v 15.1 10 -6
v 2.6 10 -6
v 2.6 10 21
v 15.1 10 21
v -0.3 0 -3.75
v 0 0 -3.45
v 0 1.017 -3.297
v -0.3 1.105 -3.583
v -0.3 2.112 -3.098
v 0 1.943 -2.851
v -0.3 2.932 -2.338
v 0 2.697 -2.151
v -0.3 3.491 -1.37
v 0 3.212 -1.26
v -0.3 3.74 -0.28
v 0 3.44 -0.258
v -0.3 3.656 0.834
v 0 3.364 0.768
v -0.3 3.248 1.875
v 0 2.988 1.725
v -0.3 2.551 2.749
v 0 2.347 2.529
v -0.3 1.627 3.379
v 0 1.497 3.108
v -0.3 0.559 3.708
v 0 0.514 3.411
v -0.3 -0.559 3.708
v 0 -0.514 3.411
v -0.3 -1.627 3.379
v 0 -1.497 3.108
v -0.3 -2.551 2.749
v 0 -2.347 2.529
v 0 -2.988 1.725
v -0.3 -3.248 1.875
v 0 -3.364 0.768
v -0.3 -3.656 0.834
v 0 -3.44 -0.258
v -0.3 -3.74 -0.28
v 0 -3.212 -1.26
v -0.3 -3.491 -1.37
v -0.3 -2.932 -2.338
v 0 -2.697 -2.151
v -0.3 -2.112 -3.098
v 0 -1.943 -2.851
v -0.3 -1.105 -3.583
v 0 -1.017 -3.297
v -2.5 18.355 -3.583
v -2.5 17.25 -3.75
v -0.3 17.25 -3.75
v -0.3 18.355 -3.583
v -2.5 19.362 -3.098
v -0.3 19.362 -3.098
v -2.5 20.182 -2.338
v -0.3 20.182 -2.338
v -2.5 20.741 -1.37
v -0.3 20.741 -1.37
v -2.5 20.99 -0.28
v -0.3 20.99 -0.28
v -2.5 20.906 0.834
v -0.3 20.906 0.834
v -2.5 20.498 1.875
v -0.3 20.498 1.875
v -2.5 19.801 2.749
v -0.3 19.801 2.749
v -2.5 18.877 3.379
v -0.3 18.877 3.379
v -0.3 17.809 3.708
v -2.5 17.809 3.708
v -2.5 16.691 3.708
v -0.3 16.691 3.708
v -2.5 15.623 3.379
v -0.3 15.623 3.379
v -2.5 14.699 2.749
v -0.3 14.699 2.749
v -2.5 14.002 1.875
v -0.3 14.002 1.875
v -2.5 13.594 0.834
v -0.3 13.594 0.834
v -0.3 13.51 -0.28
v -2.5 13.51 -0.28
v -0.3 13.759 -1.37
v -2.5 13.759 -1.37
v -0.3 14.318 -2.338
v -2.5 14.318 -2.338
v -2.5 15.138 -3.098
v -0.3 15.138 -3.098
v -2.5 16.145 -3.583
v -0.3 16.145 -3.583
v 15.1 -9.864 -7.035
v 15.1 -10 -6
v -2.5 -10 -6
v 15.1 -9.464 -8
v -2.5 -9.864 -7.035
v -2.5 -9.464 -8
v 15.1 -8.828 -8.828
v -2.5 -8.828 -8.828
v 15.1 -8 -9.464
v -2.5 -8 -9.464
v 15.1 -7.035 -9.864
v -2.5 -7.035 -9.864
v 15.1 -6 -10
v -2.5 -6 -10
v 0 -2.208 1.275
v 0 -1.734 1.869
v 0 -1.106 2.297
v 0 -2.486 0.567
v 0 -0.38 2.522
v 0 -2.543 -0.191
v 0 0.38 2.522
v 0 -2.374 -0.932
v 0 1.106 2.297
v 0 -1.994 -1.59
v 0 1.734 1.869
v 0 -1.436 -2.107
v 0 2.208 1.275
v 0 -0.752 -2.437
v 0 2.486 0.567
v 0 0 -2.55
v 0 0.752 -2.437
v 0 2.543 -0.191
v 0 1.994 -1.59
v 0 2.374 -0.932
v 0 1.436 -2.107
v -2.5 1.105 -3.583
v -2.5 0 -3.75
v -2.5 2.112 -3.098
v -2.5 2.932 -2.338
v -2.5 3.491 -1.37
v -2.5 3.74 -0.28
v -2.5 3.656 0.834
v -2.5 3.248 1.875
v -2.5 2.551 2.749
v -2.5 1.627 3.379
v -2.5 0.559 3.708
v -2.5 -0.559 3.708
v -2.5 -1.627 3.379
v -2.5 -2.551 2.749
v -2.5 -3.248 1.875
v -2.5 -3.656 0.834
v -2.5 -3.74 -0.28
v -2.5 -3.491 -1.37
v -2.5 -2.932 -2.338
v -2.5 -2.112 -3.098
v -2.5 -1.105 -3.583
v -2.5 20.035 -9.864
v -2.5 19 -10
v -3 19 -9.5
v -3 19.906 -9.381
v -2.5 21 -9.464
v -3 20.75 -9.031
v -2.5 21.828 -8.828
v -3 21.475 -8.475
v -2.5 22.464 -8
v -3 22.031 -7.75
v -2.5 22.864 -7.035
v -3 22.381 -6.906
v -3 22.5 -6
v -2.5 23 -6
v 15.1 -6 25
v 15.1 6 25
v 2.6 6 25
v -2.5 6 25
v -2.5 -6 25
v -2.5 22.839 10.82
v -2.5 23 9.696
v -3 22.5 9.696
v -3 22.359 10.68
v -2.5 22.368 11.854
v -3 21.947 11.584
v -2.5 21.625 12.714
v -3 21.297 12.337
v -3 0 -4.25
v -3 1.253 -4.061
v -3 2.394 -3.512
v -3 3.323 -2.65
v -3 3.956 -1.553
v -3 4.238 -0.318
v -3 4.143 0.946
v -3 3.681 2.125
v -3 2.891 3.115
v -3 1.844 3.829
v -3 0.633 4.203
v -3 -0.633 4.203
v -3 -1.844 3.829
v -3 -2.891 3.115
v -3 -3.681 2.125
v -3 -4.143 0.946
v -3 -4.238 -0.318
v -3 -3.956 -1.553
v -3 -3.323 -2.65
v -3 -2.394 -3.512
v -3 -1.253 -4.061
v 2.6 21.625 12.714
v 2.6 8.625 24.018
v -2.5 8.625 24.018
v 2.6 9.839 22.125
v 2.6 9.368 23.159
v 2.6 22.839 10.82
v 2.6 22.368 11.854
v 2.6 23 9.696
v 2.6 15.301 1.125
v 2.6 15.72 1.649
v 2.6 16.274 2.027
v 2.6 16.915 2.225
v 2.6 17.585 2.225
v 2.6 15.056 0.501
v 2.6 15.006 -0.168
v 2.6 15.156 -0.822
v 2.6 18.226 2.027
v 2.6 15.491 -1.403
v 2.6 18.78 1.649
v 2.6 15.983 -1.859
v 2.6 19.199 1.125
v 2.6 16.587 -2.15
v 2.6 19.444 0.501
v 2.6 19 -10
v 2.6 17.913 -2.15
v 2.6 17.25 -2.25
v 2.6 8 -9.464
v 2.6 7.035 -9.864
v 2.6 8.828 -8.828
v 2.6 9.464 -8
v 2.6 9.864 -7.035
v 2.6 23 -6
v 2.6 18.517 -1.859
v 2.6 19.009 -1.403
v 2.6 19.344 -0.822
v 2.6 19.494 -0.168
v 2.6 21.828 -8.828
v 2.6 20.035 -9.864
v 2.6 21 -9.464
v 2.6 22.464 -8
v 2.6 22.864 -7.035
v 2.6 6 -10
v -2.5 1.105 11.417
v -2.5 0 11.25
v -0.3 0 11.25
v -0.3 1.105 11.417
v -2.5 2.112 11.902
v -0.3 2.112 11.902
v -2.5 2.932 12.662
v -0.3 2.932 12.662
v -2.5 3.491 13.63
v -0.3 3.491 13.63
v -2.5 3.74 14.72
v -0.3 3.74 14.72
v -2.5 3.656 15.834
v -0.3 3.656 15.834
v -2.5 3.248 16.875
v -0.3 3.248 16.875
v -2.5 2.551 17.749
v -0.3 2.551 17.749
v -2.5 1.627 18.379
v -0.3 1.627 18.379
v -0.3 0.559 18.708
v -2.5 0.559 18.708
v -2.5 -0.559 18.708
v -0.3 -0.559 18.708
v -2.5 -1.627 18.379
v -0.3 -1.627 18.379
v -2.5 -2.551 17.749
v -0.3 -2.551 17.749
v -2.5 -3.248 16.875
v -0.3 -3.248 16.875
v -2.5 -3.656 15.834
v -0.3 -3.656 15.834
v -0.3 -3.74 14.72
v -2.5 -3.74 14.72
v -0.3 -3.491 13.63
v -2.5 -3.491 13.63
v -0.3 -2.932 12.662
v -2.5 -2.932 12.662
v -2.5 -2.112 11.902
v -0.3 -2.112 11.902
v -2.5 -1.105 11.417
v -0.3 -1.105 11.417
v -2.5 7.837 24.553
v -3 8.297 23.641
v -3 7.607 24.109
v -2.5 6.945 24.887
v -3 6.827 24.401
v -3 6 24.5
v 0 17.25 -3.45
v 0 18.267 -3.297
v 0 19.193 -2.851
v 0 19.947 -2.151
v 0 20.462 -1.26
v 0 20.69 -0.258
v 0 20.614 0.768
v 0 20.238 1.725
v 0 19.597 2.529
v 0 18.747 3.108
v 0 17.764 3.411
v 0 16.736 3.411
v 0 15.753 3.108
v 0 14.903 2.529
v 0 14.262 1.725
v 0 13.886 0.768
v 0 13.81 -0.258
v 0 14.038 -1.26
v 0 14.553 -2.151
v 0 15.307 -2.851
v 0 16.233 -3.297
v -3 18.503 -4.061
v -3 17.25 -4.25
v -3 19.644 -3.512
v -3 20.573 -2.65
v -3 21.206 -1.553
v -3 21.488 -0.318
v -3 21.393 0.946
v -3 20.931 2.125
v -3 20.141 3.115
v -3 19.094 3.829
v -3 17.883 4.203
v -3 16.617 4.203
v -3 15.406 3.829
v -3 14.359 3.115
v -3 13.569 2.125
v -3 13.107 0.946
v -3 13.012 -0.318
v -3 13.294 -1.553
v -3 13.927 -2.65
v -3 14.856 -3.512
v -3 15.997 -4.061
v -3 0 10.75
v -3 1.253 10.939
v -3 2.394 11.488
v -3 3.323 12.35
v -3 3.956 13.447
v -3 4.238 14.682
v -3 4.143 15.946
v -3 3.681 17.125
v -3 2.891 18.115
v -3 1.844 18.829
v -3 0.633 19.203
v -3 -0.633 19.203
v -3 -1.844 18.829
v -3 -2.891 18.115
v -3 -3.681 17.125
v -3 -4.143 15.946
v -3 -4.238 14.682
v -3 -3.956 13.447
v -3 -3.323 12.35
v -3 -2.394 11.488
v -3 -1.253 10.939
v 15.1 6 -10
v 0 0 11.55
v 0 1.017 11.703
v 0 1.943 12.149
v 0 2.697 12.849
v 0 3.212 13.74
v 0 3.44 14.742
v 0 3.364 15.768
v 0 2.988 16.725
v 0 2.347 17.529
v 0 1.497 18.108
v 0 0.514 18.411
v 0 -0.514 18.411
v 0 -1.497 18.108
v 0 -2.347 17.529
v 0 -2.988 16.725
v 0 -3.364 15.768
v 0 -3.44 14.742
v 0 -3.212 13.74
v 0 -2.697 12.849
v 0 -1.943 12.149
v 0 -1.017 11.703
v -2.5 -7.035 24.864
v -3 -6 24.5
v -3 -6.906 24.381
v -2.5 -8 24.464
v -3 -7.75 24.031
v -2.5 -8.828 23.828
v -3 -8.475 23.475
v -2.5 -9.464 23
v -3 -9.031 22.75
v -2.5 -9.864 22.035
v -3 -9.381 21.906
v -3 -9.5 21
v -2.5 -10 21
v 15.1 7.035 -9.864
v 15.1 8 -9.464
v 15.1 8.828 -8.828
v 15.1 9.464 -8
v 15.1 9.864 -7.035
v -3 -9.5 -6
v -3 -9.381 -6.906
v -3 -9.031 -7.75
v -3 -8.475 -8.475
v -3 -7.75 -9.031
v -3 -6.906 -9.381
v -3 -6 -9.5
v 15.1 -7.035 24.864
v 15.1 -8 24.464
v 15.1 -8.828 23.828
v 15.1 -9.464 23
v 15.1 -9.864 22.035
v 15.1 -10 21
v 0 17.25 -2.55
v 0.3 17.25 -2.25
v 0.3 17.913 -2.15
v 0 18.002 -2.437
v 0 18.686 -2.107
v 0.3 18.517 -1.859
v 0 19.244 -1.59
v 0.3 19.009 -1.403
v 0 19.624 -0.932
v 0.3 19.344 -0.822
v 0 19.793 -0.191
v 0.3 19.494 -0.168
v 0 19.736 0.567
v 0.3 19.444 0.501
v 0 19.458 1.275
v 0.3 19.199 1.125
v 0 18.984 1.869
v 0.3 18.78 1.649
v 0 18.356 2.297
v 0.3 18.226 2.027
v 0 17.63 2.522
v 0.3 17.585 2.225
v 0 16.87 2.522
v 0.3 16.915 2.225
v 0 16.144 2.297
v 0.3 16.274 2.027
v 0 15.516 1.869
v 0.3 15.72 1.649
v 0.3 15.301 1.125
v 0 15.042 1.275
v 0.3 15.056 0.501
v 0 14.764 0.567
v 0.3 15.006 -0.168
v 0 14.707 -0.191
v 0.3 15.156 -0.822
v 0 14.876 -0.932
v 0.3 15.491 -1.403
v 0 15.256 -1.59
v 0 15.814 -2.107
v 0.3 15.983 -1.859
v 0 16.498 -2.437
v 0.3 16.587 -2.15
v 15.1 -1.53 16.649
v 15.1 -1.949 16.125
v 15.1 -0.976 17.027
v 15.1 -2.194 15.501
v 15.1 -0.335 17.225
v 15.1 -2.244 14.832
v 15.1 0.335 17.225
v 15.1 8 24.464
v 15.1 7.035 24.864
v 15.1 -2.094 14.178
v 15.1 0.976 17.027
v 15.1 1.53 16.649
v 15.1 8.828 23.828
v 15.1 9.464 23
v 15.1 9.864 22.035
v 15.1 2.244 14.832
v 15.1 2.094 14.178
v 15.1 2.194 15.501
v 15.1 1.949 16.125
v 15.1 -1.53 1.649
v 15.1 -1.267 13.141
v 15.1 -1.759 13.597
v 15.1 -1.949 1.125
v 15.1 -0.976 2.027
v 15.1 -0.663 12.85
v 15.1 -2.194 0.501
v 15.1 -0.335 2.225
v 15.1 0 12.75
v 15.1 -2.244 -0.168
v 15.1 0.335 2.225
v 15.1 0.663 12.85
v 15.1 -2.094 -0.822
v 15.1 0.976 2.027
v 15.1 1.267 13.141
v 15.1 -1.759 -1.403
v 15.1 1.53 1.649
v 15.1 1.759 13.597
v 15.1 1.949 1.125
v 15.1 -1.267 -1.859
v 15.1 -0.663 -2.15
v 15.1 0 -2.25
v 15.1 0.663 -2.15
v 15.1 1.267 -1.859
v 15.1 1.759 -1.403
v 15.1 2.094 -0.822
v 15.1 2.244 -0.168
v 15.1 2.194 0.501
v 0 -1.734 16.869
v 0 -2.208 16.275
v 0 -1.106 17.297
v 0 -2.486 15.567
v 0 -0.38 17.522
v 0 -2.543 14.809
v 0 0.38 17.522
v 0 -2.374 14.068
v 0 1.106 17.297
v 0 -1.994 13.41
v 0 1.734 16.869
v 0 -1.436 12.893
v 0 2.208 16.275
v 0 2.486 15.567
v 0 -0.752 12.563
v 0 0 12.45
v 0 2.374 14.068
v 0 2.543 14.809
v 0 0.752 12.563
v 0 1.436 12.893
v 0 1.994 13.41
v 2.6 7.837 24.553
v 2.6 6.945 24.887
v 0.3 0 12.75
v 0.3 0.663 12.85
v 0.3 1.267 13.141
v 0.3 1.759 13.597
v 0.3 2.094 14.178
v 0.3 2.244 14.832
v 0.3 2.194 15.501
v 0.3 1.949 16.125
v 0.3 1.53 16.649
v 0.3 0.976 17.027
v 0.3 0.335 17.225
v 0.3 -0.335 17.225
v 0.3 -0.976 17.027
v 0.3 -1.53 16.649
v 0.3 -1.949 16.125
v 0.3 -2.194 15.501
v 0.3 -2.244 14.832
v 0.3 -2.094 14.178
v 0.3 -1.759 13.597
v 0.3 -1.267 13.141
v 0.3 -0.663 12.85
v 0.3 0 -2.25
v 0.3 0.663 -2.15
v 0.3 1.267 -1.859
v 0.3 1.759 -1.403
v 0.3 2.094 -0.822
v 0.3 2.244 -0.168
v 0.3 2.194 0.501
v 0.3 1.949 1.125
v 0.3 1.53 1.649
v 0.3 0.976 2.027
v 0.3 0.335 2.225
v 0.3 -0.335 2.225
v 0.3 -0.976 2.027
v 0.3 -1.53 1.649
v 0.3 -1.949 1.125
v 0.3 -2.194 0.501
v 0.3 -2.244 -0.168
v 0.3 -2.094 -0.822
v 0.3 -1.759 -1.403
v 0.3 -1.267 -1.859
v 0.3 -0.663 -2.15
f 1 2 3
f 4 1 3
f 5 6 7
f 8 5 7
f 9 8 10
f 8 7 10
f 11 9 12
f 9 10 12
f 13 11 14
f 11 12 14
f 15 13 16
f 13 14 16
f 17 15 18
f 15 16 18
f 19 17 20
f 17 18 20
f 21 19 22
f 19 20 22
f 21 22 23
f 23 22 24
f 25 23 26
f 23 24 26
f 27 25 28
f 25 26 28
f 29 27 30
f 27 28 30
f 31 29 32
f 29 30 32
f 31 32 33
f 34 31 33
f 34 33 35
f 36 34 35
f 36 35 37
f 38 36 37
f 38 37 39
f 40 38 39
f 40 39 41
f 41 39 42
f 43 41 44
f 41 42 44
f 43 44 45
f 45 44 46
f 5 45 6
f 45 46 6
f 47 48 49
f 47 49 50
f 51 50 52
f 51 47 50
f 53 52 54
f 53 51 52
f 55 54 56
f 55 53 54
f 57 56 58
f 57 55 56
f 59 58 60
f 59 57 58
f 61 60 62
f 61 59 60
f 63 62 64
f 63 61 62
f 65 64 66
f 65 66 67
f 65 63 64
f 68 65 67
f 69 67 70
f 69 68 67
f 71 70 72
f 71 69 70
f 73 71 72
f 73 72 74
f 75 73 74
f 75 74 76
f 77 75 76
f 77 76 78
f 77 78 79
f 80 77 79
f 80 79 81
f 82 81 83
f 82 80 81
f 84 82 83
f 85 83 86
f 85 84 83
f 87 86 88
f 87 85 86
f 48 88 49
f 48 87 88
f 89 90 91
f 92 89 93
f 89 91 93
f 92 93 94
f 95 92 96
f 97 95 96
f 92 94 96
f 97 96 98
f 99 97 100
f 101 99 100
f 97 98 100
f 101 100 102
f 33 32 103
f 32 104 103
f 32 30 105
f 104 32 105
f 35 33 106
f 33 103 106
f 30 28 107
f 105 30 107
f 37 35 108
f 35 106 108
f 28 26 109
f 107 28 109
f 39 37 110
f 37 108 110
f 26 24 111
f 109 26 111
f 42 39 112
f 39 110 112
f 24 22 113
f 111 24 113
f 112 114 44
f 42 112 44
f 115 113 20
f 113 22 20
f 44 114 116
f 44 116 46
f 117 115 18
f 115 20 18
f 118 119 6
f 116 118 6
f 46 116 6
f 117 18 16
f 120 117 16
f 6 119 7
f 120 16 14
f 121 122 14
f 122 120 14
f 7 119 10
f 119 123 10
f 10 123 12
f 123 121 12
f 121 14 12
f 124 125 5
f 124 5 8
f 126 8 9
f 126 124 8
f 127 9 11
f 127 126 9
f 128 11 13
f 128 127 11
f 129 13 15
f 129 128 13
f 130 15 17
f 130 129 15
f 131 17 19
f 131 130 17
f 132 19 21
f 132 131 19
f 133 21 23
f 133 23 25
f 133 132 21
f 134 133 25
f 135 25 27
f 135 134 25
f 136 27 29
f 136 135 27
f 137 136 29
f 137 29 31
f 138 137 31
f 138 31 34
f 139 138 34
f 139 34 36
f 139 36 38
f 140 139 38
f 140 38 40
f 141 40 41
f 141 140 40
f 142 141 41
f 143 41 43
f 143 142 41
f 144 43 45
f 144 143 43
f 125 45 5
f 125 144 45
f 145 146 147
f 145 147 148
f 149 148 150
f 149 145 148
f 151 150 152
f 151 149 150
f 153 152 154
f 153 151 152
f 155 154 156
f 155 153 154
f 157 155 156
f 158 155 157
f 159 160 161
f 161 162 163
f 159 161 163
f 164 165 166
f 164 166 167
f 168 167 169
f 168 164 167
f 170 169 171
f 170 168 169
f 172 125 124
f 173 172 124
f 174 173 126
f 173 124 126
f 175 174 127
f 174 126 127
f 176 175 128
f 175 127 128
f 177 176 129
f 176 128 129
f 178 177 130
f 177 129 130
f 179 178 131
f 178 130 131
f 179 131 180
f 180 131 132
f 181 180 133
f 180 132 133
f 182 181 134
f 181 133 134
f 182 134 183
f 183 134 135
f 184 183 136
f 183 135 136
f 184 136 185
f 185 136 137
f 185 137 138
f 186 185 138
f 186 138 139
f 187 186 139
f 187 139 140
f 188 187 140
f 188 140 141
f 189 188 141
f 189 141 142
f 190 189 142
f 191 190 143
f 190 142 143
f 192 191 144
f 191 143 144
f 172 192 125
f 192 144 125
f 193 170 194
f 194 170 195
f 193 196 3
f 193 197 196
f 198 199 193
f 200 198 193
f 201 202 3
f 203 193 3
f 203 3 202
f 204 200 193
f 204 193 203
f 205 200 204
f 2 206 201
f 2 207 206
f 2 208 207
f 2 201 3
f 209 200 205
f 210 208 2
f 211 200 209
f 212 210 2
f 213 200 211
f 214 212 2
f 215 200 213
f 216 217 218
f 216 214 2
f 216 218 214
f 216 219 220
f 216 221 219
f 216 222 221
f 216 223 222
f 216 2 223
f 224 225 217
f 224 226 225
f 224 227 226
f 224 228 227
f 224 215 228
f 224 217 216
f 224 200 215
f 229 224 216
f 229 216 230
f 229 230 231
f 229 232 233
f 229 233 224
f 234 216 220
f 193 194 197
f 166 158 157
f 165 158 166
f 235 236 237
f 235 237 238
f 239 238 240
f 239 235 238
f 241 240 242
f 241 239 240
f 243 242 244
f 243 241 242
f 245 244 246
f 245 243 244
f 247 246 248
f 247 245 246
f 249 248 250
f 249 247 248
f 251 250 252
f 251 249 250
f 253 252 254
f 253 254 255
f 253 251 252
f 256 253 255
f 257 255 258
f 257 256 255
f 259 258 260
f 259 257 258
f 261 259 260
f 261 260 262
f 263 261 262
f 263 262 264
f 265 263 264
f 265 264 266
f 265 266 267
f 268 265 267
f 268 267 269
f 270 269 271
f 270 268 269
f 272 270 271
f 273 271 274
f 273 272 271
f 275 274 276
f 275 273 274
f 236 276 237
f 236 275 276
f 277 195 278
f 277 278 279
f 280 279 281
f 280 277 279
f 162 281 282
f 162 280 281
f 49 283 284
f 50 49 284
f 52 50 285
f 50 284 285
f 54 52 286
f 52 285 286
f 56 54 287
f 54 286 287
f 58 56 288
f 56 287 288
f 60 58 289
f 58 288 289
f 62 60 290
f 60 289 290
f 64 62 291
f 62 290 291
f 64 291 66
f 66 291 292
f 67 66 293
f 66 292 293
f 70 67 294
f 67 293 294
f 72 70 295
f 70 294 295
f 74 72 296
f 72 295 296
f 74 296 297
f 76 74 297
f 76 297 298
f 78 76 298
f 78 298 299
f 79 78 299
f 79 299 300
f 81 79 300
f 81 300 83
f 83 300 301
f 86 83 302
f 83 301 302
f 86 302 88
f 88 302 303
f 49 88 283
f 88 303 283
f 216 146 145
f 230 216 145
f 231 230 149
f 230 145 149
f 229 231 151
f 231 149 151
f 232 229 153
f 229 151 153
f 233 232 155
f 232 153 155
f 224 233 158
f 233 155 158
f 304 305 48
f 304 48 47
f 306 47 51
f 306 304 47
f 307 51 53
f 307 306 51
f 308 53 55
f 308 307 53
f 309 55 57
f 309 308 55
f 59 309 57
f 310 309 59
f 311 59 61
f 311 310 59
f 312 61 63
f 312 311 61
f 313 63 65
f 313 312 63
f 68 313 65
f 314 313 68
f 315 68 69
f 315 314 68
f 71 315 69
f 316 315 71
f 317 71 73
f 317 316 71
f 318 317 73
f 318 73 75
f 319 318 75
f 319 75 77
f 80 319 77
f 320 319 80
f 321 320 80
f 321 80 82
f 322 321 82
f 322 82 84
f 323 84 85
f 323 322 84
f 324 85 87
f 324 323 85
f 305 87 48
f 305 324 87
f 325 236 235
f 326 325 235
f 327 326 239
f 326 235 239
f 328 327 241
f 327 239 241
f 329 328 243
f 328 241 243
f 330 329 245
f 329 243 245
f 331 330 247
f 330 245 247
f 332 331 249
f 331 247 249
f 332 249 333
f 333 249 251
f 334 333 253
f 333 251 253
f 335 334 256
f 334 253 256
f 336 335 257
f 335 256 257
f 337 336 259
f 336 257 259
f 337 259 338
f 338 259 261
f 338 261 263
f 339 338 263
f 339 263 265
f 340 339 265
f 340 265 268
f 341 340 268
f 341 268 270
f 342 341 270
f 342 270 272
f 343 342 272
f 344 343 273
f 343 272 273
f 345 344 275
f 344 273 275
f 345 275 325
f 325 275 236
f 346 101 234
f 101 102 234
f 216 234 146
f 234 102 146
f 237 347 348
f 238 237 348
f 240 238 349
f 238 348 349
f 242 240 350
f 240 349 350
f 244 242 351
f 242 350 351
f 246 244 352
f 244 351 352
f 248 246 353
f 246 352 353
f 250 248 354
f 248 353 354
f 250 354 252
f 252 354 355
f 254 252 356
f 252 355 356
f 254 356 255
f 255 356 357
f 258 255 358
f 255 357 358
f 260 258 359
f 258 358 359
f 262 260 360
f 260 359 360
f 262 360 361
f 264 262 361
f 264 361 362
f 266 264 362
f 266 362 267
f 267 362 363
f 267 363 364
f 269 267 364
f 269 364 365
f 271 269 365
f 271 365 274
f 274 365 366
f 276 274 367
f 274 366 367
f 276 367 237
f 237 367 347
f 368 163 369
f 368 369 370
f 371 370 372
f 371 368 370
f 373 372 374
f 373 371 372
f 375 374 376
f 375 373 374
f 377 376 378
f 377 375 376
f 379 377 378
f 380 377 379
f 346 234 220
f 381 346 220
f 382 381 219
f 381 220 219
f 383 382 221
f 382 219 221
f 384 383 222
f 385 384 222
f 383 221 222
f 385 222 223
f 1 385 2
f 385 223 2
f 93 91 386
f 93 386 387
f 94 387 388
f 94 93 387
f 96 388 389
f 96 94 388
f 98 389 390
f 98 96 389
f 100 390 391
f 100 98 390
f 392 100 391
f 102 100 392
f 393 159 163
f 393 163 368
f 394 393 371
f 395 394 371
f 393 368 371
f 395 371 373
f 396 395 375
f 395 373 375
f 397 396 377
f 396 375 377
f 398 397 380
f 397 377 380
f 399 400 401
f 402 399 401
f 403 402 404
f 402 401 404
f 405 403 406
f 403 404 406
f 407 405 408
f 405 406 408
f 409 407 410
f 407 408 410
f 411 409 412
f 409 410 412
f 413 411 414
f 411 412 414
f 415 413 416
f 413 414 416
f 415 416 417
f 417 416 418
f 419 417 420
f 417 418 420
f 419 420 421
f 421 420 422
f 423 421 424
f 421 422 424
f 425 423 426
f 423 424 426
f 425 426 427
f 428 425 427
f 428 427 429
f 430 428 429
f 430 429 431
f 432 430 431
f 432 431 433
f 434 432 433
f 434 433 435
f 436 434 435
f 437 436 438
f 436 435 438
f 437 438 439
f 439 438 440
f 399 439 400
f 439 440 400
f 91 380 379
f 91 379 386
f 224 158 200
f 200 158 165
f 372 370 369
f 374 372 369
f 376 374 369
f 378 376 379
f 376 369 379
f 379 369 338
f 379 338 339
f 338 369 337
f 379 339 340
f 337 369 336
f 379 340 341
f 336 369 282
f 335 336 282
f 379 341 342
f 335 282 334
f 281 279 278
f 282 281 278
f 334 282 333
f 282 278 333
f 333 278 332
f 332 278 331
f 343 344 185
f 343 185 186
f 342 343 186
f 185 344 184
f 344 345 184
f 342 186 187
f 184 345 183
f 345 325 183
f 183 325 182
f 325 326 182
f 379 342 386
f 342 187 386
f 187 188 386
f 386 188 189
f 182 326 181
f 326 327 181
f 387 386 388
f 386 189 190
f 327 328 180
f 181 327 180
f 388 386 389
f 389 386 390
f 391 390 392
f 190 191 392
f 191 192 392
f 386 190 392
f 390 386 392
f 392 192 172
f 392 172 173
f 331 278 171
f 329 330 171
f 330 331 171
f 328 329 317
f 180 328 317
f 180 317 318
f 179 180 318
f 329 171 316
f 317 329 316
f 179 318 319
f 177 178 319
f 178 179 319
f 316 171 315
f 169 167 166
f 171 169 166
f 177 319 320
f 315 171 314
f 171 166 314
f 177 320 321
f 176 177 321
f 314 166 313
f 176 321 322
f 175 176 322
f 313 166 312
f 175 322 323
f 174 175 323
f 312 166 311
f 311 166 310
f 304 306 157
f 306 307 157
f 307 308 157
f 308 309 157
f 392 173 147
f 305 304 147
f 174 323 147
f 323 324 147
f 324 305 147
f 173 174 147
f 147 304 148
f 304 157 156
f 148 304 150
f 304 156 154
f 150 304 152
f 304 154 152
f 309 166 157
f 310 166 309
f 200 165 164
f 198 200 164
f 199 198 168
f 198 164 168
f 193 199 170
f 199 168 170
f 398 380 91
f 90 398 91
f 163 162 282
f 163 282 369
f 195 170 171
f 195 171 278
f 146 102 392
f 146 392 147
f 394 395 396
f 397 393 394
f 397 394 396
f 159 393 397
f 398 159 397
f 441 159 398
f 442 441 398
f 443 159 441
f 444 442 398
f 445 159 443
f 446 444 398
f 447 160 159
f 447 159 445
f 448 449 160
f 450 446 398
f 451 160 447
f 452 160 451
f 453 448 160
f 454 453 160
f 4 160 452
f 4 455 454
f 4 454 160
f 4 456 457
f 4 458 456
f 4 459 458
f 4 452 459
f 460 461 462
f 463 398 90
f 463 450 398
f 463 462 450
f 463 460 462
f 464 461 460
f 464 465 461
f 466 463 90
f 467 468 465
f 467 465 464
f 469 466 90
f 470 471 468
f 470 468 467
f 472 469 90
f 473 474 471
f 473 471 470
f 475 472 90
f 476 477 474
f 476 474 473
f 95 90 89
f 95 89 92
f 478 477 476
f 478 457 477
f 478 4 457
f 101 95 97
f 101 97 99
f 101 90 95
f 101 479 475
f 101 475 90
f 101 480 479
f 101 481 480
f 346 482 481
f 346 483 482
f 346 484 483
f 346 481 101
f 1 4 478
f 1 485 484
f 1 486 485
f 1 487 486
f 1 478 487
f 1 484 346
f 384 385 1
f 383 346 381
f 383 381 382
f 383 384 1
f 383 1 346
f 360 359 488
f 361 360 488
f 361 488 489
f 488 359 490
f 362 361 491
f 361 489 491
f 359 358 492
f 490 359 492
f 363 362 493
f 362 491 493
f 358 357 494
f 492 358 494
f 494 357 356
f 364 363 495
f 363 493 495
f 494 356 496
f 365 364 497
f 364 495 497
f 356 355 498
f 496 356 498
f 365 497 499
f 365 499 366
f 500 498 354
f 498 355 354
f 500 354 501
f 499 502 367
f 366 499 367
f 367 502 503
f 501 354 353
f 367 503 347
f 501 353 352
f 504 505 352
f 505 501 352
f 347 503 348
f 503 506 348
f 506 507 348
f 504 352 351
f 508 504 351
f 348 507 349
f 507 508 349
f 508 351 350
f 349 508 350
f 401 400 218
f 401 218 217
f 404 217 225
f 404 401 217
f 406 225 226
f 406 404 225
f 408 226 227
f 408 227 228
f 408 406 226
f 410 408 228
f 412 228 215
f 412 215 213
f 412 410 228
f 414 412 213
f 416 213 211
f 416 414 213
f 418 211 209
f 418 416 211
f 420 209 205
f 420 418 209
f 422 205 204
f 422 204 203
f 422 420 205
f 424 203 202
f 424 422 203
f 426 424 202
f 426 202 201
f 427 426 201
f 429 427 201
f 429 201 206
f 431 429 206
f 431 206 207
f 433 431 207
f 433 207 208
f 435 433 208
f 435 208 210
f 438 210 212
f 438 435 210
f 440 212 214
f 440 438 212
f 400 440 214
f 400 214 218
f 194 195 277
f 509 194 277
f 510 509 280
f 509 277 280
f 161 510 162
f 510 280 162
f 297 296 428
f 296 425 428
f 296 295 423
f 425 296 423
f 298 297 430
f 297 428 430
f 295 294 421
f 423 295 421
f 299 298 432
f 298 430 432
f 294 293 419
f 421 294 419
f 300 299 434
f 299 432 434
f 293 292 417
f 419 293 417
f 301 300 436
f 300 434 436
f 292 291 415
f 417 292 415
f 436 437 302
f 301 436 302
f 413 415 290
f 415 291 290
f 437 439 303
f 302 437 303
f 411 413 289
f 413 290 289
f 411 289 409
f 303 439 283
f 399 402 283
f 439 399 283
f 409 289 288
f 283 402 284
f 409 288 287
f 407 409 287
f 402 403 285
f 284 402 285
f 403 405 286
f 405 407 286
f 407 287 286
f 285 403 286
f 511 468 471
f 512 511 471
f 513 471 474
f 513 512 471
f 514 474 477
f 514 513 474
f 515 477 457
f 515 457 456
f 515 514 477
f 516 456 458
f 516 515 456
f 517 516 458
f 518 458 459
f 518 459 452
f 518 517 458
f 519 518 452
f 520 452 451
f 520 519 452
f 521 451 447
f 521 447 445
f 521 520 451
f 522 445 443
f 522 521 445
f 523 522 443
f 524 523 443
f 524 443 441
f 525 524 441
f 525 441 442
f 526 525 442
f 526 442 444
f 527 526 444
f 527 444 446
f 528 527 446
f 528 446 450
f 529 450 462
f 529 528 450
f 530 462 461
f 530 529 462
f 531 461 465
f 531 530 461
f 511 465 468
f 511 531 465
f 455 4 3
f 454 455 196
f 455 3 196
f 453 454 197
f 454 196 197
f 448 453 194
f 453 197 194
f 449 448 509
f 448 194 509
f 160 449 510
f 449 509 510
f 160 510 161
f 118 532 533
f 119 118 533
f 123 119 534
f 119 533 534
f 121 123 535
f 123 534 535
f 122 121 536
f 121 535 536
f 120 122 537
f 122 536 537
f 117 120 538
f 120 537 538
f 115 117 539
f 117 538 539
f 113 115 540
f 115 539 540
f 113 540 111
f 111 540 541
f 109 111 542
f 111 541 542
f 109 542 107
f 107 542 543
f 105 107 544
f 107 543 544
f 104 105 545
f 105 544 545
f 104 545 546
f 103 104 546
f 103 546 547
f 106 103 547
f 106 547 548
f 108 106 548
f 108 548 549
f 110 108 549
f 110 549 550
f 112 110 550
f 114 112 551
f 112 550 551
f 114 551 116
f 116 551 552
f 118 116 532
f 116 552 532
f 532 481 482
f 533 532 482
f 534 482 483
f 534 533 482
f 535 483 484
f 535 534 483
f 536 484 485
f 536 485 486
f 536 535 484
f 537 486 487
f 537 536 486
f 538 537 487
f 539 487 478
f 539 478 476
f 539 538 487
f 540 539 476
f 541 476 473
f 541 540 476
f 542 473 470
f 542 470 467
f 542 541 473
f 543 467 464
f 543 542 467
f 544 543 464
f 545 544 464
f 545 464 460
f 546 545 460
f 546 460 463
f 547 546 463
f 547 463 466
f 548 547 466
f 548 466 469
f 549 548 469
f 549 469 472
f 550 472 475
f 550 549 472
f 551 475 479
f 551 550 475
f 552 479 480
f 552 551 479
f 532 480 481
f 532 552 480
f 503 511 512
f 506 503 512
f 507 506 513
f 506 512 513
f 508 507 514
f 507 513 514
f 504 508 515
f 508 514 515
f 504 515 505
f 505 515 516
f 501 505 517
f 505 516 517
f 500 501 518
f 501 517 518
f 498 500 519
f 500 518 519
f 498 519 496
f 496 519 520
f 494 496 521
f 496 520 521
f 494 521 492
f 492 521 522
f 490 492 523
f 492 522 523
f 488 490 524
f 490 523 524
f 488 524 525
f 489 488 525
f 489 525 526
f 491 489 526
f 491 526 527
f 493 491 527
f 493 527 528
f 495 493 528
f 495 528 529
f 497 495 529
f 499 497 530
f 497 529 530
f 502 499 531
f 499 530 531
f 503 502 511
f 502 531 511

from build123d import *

# Parameters (mm, degrees)
SKETCH1_R           = 2.25
BOSS_EXTRUDE1_DEPTH = 2.6
BOSS_EXTRUDE3_START = -3
SKETCH3_R           = 3.75
BOSS_EXTRUDE3_DEPTH = 3
CHAMFER2_SIZE       = 0.3
CHAMFER3_SIZE       = 0.5
SKETCH4_R           = 2.25
BOSS_EXTRUDE4_DEPTH = 12.5


with BuildPart() as part:
    # Sketch1 → Boss-Extrude1 (new body)
    with BuildSketch(Plane(origin=(0, 0, 0), x_dir=(0, 0, -1), z_dir=(1, 0, 0))):
        with BuildLine():
            Line((-21, -10), (6, -10))
            ThreePointArc((6, -10), (8.828427125, -8.828427125), (10, -6))
            Line((10, -6), (10, 19))
            ThreePointArc((10, 19), (8.828427125, 21.828427125), (6, 23))
            Line((6, 23), (-9.695652174, 23))
            ThreePointArc((-9.695652174, 23), (-11.354136506, 22.63997661), (-12.714074263, 21.62471486))
            Line((-12.714074263, 21.62471486), (-24.018422089, 8.62471486))
            ThreePointArc((-24.018422089, 8.62471486), (-24.746577662, 7.401126626), (-25, 6))
            Line((-25, 6), (-25, -6))
            ThreePointArc((-25, -6), (-23.828427125, -8.828427125), (-21, -10))
        make_face()
        with Locations((-15, 0)):
            Circle(SKETCH1_R, mode=Mode.SUBTRACT)
        with Locations((0, 17.25)):
            Circle(SKETCH1_R, mode=Mode.SUBTRACT)
        Circle(SKETCH1_R, mode=Mode.SUBTRACT)
    extrude(amount=BOSS_EXTRUDE1_DEPTH)

    # Sketch3 → Boss-Extrude3 (add)
    with BuildSketch(Plane(origin=(0, 0, 0), x_dir=(0, 0, -1), z_dir=(1, 0, 0)).offset(BOSS_EXTRUDE3_START)):
        with BuildLine():
            Line((-21, -10), (6, -10))
            ThreePointArc((6, -10), (8.828427125, -8.828427125), (10, -6))
            Line((10, -6), (10, 19))
            ThreePointArc((10, 19), (8.828427125, 21.828427125), (6, 23))
            Line((6, 23), (-9.695652174, 23))
            ThreePointArc((-9.695652174, 23), (-11.354136506, 22.63997661), (-12.714074263, 21.62471486))
            Line((-12.714074263, 21.62471486), (-24.018422089, 8.62471486))
            ThreePointArc((-24.018422089, 8.62471486), (-24.746577662, 7.401126626), (-25, 6))
            Line((-25, 6), (-25, -6))
            ThreePointArc((-25, -6), (-23.828427125, -8.828427125), (-21, -10))
        make_face()
        with Locations((-15, 0)):
            Circle(SKETCH3_R, mode=Mode.SUBTRACT)
        Circle(SKETCH3_R, mode=Mode.SUBTRACT)
        with Locations((0, 17.25)):
            Circle(SKETCH3_R, mode=Mode.SUBTRACT)
    extrude(amount=BOSS_EXTRUDE3_DEPTH)

    # Chamfer2
    chamfer2_edges = [part.edges().sort_by_distance(p)[0] for p in [
        (0, 0, 17.25),
        (0, 17.25, 2.25),
        (0, 0, 2.25),
        (0, 0, 18.75),
        (0, 0, 3.75),
        (0, 17.25, 3.75),
    ]]
    chamfer(chamfer2_edges, length=CHAMFER2_SIZE)

    # Chamfer3
    chamfer3_edges = [part.edges().sort_by_distance(p)[0] for p in [
        (-3, -8.828427125, 23.828427125),
        (-3, 0, 25),
        (-3, 7.401126626, 24.746577662),
        (-3, 15.12471486, 18.366248176),
        (-3, 22.63997661, 11.354136506),
        (-3, 23, 1.847826087),
        (-3, 21.828427125, -8.828427125),
        (-3, 6.5, -10),
        (-3, -8.828427125, -8.828427125),
        (-3, -10, 7.5),
        (-3, 17.25, 3.75),
        (-3, 0, 3.75),
        (-3, 0, 18.75),
    ]]
    chamfer(chamfer3_edges, length=CHAMFER3_SIZE)

    # Sketch4 → Boss-Extrude4 (add)
    with BuildSketch(Plane(origin=(2.6, 0, 0), x_dir=(0, 0, -1), z_dir=(1, 0, 0))):
        with BuildLine():
            Line((-21, -10), (6, -10))
            ThreePointArc((6, -10), (8.828427125, -8.828427125), (10, -6))
            Line((10, -6), (10, 6))
            ThreePointArc((10, 6), (8.828427125, 8.828427125), (6, 10))
            Line((6, 10), (-21, 10))
            ThreePointArc((-21, 10), (-23.828427125, 8.828427125), (-25, 6))
            Line((-25, 6), (-25, -6))
            ThreePointArc((-25, -6), (-23.828427125, -8.828427125), (-21, -10))
        make_face()
        Circle(SKETCH4_R, mode=Mode.SUBTRACT)
        with Locations((-15, 0)):
            Circle(SKETCH4_R, mode=Mode.SUBTRACT)
    extrude(amount=BOSS_EXTRUDE4_DEPTH)


solid = part.part
